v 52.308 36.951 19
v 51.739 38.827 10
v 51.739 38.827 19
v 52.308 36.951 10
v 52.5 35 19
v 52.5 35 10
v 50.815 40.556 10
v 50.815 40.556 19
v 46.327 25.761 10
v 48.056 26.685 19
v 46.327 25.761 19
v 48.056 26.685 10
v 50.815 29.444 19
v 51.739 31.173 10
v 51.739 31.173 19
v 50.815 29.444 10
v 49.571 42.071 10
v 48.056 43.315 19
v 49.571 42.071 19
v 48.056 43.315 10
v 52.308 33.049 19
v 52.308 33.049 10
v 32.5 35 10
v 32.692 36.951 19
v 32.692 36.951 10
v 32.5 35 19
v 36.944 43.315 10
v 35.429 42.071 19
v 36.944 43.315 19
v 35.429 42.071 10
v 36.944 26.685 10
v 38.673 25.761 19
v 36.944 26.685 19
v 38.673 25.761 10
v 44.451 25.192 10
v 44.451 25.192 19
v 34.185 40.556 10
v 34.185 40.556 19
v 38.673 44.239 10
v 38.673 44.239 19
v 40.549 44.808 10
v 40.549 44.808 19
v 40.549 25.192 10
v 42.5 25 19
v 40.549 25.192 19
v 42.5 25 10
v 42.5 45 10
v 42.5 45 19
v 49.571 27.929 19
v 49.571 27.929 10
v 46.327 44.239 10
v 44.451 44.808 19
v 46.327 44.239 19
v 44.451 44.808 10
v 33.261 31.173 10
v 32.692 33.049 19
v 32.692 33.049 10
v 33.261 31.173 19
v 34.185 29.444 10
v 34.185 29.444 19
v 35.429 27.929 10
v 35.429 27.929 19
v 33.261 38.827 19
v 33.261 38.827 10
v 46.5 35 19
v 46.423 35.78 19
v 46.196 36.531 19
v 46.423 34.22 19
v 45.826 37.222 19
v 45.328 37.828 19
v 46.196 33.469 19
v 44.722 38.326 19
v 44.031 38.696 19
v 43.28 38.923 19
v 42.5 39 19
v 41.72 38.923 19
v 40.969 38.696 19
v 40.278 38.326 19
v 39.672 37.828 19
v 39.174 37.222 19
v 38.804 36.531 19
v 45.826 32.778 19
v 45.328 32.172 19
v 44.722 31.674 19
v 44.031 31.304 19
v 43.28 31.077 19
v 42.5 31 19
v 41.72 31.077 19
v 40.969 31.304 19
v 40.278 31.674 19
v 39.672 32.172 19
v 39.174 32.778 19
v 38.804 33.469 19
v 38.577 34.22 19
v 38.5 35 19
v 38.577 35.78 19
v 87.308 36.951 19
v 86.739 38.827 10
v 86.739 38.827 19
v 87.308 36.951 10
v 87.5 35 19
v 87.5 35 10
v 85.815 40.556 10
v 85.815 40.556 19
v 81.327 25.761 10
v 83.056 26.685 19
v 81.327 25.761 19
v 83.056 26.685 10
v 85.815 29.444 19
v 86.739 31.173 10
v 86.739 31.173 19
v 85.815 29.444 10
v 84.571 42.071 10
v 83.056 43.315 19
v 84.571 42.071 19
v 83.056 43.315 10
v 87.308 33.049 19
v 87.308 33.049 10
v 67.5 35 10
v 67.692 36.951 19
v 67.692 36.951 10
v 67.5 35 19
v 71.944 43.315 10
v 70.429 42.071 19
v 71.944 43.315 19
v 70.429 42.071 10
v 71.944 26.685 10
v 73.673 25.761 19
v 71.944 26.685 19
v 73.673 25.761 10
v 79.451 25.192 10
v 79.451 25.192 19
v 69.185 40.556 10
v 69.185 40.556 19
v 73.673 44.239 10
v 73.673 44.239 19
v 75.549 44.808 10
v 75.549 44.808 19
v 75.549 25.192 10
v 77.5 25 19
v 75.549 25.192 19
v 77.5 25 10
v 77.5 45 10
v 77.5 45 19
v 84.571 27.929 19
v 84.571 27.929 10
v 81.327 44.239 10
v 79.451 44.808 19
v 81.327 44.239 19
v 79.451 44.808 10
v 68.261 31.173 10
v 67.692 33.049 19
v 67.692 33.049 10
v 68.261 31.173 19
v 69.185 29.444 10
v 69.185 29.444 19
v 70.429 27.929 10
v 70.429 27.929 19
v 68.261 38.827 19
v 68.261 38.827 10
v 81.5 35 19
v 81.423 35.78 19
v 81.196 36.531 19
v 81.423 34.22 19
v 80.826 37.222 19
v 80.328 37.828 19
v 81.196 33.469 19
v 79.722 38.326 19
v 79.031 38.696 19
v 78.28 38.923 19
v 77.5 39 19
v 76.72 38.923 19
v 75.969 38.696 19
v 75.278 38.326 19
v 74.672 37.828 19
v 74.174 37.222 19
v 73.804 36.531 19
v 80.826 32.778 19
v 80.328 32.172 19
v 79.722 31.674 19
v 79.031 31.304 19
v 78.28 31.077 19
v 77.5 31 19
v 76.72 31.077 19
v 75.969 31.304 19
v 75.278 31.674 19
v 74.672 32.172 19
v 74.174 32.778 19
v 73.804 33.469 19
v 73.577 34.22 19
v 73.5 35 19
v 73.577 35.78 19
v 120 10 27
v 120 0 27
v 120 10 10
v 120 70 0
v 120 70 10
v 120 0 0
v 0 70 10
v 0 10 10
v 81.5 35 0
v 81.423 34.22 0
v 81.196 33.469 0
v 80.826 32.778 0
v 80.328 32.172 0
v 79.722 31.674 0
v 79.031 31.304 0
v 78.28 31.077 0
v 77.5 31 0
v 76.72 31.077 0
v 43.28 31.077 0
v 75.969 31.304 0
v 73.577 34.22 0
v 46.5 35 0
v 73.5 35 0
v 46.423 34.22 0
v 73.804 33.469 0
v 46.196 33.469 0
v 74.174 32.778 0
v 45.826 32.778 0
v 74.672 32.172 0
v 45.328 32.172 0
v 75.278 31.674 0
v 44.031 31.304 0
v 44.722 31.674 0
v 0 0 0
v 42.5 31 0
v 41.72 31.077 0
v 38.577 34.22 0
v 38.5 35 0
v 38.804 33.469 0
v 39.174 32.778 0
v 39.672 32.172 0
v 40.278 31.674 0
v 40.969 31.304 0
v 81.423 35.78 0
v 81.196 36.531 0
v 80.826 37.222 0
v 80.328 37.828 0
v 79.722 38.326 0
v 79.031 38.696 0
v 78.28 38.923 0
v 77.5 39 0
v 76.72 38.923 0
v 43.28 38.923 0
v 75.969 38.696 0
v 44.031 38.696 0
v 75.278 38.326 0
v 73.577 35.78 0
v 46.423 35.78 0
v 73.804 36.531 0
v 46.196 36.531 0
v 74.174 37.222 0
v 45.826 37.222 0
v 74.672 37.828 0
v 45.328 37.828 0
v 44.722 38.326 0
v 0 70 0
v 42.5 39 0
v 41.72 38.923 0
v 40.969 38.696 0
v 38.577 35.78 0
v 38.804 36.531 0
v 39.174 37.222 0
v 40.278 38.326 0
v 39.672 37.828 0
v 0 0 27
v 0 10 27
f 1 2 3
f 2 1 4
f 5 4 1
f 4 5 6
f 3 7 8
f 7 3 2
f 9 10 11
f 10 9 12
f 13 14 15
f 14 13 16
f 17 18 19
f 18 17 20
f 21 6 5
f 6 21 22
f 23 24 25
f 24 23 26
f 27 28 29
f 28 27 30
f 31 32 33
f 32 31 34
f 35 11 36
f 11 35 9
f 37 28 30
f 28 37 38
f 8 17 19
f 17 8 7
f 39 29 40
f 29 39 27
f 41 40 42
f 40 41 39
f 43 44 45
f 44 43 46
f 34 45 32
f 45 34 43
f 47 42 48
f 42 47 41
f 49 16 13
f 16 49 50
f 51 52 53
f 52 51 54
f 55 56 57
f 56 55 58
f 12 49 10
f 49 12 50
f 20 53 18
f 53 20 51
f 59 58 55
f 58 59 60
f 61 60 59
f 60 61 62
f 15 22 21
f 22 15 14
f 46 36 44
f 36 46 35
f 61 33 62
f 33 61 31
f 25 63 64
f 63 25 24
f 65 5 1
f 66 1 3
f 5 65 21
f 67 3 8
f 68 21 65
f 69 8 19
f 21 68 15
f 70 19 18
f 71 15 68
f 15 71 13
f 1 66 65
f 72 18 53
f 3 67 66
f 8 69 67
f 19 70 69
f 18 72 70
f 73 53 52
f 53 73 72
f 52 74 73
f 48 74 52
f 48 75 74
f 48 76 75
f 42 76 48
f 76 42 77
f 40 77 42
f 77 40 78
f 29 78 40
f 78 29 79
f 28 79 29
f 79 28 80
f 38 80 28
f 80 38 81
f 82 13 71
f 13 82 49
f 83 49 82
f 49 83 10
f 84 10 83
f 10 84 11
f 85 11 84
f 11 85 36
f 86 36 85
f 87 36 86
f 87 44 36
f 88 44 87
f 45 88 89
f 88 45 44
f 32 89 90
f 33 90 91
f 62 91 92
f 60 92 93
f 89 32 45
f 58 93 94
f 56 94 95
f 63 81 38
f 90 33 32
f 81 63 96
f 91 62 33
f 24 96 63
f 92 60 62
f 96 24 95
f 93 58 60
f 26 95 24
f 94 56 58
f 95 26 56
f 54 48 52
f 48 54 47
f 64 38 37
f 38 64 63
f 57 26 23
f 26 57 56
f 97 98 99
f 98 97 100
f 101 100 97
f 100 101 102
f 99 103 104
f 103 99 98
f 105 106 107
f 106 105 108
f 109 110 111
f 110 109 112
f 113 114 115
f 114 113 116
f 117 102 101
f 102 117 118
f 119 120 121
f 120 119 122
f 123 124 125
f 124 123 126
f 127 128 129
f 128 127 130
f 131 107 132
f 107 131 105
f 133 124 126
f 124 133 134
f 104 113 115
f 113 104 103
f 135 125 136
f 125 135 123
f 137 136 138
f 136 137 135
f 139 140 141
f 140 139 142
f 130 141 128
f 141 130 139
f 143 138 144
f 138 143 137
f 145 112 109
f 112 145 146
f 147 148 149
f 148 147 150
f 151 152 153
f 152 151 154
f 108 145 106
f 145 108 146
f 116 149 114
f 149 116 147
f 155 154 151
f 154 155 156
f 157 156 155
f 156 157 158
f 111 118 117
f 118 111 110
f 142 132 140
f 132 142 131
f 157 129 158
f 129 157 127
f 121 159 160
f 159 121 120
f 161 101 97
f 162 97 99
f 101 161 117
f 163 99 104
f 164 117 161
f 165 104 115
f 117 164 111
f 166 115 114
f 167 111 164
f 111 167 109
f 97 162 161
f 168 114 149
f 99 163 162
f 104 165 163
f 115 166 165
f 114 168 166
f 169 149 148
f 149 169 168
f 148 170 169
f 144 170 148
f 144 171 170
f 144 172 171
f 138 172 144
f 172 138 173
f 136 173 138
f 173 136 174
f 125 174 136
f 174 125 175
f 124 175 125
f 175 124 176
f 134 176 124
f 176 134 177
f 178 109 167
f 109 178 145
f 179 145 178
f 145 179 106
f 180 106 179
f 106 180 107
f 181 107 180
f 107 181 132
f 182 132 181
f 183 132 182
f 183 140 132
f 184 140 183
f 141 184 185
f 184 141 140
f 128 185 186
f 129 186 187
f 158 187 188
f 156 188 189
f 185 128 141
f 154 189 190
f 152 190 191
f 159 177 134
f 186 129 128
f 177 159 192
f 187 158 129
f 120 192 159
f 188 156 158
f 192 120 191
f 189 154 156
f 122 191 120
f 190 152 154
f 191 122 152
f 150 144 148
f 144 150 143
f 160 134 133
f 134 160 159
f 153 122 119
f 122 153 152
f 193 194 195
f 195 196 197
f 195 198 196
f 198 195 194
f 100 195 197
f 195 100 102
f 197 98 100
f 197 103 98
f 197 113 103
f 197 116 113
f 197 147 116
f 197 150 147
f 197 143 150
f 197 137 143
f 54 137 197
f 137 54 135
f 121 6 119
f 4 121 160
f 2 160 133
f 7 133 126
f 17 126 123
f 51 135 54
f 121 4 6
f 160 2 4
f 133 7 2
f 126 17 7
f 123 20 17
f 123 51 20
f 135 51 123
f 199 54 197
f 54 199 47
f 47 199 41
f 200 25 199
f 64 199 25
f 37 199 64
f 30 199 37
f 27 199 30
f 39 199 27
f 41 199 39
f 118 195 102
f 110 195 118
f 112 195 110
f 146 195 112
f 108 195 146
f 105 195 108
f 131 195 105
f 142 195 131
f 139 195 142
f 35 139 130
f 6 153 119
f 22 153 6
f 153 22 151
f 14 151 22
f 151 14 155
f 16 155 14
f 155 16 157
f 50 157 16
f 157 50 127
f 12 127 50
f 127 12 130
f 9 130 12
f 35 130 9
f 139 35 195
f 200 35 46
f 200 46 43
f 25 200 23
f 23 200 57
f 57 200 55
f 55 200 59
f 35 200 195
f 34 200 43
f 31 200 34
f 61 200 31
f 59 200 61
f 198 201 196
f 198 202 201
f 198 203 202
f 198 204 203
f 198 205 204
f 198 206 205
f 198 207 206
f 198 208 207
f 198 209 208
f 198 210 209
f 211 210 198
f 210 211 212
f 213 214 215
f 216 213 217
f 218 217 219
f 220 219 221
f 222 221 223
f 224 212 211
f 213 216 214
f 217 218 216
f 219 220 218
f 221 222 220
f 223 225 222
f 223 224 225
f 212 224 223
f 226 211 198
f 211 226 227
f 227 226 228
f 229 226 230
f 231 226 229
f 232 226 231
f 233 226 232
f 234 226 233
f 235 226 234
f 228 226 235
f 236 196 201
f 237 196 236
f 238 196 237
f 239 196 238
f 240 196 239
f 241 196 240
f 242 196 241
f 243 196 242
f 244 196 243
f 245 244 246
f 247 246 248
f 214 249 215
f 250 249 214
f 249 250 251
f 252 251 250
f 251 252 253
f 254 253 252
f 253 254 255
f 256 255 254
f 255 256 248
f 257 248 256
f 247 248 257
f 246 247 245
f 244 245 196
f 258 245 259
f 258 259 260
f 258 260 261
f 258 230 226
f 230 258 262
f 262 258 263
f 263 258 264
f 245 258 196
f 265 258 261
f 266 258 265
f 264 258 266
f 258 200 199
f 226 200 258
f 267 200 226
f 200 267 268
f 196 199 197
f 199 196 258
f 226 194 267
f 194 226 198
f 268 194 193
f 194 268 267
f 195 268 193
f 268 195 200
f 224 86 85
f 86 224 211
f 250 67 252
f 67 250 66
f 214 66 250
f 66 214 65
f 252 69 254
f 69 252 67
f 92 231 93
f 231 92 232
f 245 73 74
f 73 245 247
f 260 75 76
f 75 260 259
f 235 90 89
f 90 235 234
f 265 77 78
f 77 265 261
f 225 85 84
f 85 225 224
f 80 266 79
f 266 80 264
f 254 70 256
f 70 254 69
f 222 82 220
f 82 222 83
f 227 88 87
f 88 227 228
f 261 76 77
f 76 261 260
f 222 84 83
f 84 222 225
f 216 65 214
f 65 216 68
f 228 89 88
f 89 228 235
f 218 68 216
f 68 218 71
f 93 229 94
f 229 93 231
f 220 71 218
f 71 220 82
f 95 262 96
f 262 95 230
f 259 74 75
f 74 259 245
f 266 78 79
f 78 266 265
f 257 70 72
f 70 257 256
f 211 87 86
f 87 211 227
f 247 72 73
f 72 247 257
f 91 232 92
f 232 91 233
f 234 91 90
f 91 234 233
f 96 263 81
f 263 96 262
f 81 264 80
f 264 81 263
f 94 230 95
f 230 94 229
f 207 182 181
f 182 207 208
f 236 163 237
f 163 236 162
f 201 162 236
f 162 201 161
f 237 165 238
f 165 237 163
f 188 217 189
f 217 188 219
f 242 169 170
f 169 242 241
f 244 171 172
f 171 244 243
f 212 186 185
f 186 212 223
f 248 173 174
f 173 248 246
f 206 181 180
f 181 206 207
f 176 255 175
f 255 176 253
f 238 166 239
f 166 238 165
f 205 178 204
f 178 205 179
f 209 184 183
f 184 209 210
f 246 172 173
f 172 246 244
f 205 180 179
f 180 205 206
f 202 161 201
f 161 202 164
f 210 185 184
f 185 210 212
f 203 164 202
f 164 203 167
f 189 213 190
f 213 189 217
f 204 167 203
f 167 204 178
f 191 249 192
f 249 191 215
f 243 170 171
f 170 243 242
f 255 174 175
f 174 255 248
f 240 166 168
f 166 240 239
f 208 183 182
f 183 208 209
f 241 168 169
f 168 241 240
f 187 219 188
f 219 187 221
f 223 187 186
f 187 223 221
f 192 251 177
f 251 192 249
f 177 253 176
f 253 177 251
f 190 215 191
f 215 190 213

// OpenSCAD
$fn = 32;

// ----------------------------------------------------------------------
// Drill jig: fence jig
// ----------------------------------------------------------------------

// --- parameters (mm) ---
plate_l = 120;            // plate length, X
plate_w = 70;             // plate width, Y
plate_t = 10;             // plate thickness
boss_d = 20;              // guide boss diameter
boss_h = 10;              // boss height above the plate
guide_d = 8;              // guide hole diameter
boss_pitch = 35;          // boss pitch
fence_h = 18;             // fence height above the plate
fence_t = 10;             // fence thickness

n_boss = 2;  // guide bosses
boss_x0 = (plate_l - (n_boss - 1) * boss_pitch) / 2;  // first boss X
boss_top = plate_t - 1 + boss_h;  // boss crown height
fence_top = plate_t - 1 + fence_h;  // fence crown height
total_h = max([fence_top, boss_top]);  // overall height

difference() {
  union() {
  cube([plate_l, plate_w, plate_t]);
  for (i = [0 : n_boss - 1])
    translate([boss_x0 + i * boss_pitch, plate_w / 2, plate_t - 1])
      cylinder(h = boss_h, d = boss_d);
  translate([0, 0, plate_t - 1]) cube([plate_l, fence_t, fence_h]);
  }
  for (i = [0 : n_boss - 1])
    translate([boss_x0 + i * boss_pitch, plate_w / 2, -1])
      cylinder(h = plate_t + boss_h, d = guide_d);
}
